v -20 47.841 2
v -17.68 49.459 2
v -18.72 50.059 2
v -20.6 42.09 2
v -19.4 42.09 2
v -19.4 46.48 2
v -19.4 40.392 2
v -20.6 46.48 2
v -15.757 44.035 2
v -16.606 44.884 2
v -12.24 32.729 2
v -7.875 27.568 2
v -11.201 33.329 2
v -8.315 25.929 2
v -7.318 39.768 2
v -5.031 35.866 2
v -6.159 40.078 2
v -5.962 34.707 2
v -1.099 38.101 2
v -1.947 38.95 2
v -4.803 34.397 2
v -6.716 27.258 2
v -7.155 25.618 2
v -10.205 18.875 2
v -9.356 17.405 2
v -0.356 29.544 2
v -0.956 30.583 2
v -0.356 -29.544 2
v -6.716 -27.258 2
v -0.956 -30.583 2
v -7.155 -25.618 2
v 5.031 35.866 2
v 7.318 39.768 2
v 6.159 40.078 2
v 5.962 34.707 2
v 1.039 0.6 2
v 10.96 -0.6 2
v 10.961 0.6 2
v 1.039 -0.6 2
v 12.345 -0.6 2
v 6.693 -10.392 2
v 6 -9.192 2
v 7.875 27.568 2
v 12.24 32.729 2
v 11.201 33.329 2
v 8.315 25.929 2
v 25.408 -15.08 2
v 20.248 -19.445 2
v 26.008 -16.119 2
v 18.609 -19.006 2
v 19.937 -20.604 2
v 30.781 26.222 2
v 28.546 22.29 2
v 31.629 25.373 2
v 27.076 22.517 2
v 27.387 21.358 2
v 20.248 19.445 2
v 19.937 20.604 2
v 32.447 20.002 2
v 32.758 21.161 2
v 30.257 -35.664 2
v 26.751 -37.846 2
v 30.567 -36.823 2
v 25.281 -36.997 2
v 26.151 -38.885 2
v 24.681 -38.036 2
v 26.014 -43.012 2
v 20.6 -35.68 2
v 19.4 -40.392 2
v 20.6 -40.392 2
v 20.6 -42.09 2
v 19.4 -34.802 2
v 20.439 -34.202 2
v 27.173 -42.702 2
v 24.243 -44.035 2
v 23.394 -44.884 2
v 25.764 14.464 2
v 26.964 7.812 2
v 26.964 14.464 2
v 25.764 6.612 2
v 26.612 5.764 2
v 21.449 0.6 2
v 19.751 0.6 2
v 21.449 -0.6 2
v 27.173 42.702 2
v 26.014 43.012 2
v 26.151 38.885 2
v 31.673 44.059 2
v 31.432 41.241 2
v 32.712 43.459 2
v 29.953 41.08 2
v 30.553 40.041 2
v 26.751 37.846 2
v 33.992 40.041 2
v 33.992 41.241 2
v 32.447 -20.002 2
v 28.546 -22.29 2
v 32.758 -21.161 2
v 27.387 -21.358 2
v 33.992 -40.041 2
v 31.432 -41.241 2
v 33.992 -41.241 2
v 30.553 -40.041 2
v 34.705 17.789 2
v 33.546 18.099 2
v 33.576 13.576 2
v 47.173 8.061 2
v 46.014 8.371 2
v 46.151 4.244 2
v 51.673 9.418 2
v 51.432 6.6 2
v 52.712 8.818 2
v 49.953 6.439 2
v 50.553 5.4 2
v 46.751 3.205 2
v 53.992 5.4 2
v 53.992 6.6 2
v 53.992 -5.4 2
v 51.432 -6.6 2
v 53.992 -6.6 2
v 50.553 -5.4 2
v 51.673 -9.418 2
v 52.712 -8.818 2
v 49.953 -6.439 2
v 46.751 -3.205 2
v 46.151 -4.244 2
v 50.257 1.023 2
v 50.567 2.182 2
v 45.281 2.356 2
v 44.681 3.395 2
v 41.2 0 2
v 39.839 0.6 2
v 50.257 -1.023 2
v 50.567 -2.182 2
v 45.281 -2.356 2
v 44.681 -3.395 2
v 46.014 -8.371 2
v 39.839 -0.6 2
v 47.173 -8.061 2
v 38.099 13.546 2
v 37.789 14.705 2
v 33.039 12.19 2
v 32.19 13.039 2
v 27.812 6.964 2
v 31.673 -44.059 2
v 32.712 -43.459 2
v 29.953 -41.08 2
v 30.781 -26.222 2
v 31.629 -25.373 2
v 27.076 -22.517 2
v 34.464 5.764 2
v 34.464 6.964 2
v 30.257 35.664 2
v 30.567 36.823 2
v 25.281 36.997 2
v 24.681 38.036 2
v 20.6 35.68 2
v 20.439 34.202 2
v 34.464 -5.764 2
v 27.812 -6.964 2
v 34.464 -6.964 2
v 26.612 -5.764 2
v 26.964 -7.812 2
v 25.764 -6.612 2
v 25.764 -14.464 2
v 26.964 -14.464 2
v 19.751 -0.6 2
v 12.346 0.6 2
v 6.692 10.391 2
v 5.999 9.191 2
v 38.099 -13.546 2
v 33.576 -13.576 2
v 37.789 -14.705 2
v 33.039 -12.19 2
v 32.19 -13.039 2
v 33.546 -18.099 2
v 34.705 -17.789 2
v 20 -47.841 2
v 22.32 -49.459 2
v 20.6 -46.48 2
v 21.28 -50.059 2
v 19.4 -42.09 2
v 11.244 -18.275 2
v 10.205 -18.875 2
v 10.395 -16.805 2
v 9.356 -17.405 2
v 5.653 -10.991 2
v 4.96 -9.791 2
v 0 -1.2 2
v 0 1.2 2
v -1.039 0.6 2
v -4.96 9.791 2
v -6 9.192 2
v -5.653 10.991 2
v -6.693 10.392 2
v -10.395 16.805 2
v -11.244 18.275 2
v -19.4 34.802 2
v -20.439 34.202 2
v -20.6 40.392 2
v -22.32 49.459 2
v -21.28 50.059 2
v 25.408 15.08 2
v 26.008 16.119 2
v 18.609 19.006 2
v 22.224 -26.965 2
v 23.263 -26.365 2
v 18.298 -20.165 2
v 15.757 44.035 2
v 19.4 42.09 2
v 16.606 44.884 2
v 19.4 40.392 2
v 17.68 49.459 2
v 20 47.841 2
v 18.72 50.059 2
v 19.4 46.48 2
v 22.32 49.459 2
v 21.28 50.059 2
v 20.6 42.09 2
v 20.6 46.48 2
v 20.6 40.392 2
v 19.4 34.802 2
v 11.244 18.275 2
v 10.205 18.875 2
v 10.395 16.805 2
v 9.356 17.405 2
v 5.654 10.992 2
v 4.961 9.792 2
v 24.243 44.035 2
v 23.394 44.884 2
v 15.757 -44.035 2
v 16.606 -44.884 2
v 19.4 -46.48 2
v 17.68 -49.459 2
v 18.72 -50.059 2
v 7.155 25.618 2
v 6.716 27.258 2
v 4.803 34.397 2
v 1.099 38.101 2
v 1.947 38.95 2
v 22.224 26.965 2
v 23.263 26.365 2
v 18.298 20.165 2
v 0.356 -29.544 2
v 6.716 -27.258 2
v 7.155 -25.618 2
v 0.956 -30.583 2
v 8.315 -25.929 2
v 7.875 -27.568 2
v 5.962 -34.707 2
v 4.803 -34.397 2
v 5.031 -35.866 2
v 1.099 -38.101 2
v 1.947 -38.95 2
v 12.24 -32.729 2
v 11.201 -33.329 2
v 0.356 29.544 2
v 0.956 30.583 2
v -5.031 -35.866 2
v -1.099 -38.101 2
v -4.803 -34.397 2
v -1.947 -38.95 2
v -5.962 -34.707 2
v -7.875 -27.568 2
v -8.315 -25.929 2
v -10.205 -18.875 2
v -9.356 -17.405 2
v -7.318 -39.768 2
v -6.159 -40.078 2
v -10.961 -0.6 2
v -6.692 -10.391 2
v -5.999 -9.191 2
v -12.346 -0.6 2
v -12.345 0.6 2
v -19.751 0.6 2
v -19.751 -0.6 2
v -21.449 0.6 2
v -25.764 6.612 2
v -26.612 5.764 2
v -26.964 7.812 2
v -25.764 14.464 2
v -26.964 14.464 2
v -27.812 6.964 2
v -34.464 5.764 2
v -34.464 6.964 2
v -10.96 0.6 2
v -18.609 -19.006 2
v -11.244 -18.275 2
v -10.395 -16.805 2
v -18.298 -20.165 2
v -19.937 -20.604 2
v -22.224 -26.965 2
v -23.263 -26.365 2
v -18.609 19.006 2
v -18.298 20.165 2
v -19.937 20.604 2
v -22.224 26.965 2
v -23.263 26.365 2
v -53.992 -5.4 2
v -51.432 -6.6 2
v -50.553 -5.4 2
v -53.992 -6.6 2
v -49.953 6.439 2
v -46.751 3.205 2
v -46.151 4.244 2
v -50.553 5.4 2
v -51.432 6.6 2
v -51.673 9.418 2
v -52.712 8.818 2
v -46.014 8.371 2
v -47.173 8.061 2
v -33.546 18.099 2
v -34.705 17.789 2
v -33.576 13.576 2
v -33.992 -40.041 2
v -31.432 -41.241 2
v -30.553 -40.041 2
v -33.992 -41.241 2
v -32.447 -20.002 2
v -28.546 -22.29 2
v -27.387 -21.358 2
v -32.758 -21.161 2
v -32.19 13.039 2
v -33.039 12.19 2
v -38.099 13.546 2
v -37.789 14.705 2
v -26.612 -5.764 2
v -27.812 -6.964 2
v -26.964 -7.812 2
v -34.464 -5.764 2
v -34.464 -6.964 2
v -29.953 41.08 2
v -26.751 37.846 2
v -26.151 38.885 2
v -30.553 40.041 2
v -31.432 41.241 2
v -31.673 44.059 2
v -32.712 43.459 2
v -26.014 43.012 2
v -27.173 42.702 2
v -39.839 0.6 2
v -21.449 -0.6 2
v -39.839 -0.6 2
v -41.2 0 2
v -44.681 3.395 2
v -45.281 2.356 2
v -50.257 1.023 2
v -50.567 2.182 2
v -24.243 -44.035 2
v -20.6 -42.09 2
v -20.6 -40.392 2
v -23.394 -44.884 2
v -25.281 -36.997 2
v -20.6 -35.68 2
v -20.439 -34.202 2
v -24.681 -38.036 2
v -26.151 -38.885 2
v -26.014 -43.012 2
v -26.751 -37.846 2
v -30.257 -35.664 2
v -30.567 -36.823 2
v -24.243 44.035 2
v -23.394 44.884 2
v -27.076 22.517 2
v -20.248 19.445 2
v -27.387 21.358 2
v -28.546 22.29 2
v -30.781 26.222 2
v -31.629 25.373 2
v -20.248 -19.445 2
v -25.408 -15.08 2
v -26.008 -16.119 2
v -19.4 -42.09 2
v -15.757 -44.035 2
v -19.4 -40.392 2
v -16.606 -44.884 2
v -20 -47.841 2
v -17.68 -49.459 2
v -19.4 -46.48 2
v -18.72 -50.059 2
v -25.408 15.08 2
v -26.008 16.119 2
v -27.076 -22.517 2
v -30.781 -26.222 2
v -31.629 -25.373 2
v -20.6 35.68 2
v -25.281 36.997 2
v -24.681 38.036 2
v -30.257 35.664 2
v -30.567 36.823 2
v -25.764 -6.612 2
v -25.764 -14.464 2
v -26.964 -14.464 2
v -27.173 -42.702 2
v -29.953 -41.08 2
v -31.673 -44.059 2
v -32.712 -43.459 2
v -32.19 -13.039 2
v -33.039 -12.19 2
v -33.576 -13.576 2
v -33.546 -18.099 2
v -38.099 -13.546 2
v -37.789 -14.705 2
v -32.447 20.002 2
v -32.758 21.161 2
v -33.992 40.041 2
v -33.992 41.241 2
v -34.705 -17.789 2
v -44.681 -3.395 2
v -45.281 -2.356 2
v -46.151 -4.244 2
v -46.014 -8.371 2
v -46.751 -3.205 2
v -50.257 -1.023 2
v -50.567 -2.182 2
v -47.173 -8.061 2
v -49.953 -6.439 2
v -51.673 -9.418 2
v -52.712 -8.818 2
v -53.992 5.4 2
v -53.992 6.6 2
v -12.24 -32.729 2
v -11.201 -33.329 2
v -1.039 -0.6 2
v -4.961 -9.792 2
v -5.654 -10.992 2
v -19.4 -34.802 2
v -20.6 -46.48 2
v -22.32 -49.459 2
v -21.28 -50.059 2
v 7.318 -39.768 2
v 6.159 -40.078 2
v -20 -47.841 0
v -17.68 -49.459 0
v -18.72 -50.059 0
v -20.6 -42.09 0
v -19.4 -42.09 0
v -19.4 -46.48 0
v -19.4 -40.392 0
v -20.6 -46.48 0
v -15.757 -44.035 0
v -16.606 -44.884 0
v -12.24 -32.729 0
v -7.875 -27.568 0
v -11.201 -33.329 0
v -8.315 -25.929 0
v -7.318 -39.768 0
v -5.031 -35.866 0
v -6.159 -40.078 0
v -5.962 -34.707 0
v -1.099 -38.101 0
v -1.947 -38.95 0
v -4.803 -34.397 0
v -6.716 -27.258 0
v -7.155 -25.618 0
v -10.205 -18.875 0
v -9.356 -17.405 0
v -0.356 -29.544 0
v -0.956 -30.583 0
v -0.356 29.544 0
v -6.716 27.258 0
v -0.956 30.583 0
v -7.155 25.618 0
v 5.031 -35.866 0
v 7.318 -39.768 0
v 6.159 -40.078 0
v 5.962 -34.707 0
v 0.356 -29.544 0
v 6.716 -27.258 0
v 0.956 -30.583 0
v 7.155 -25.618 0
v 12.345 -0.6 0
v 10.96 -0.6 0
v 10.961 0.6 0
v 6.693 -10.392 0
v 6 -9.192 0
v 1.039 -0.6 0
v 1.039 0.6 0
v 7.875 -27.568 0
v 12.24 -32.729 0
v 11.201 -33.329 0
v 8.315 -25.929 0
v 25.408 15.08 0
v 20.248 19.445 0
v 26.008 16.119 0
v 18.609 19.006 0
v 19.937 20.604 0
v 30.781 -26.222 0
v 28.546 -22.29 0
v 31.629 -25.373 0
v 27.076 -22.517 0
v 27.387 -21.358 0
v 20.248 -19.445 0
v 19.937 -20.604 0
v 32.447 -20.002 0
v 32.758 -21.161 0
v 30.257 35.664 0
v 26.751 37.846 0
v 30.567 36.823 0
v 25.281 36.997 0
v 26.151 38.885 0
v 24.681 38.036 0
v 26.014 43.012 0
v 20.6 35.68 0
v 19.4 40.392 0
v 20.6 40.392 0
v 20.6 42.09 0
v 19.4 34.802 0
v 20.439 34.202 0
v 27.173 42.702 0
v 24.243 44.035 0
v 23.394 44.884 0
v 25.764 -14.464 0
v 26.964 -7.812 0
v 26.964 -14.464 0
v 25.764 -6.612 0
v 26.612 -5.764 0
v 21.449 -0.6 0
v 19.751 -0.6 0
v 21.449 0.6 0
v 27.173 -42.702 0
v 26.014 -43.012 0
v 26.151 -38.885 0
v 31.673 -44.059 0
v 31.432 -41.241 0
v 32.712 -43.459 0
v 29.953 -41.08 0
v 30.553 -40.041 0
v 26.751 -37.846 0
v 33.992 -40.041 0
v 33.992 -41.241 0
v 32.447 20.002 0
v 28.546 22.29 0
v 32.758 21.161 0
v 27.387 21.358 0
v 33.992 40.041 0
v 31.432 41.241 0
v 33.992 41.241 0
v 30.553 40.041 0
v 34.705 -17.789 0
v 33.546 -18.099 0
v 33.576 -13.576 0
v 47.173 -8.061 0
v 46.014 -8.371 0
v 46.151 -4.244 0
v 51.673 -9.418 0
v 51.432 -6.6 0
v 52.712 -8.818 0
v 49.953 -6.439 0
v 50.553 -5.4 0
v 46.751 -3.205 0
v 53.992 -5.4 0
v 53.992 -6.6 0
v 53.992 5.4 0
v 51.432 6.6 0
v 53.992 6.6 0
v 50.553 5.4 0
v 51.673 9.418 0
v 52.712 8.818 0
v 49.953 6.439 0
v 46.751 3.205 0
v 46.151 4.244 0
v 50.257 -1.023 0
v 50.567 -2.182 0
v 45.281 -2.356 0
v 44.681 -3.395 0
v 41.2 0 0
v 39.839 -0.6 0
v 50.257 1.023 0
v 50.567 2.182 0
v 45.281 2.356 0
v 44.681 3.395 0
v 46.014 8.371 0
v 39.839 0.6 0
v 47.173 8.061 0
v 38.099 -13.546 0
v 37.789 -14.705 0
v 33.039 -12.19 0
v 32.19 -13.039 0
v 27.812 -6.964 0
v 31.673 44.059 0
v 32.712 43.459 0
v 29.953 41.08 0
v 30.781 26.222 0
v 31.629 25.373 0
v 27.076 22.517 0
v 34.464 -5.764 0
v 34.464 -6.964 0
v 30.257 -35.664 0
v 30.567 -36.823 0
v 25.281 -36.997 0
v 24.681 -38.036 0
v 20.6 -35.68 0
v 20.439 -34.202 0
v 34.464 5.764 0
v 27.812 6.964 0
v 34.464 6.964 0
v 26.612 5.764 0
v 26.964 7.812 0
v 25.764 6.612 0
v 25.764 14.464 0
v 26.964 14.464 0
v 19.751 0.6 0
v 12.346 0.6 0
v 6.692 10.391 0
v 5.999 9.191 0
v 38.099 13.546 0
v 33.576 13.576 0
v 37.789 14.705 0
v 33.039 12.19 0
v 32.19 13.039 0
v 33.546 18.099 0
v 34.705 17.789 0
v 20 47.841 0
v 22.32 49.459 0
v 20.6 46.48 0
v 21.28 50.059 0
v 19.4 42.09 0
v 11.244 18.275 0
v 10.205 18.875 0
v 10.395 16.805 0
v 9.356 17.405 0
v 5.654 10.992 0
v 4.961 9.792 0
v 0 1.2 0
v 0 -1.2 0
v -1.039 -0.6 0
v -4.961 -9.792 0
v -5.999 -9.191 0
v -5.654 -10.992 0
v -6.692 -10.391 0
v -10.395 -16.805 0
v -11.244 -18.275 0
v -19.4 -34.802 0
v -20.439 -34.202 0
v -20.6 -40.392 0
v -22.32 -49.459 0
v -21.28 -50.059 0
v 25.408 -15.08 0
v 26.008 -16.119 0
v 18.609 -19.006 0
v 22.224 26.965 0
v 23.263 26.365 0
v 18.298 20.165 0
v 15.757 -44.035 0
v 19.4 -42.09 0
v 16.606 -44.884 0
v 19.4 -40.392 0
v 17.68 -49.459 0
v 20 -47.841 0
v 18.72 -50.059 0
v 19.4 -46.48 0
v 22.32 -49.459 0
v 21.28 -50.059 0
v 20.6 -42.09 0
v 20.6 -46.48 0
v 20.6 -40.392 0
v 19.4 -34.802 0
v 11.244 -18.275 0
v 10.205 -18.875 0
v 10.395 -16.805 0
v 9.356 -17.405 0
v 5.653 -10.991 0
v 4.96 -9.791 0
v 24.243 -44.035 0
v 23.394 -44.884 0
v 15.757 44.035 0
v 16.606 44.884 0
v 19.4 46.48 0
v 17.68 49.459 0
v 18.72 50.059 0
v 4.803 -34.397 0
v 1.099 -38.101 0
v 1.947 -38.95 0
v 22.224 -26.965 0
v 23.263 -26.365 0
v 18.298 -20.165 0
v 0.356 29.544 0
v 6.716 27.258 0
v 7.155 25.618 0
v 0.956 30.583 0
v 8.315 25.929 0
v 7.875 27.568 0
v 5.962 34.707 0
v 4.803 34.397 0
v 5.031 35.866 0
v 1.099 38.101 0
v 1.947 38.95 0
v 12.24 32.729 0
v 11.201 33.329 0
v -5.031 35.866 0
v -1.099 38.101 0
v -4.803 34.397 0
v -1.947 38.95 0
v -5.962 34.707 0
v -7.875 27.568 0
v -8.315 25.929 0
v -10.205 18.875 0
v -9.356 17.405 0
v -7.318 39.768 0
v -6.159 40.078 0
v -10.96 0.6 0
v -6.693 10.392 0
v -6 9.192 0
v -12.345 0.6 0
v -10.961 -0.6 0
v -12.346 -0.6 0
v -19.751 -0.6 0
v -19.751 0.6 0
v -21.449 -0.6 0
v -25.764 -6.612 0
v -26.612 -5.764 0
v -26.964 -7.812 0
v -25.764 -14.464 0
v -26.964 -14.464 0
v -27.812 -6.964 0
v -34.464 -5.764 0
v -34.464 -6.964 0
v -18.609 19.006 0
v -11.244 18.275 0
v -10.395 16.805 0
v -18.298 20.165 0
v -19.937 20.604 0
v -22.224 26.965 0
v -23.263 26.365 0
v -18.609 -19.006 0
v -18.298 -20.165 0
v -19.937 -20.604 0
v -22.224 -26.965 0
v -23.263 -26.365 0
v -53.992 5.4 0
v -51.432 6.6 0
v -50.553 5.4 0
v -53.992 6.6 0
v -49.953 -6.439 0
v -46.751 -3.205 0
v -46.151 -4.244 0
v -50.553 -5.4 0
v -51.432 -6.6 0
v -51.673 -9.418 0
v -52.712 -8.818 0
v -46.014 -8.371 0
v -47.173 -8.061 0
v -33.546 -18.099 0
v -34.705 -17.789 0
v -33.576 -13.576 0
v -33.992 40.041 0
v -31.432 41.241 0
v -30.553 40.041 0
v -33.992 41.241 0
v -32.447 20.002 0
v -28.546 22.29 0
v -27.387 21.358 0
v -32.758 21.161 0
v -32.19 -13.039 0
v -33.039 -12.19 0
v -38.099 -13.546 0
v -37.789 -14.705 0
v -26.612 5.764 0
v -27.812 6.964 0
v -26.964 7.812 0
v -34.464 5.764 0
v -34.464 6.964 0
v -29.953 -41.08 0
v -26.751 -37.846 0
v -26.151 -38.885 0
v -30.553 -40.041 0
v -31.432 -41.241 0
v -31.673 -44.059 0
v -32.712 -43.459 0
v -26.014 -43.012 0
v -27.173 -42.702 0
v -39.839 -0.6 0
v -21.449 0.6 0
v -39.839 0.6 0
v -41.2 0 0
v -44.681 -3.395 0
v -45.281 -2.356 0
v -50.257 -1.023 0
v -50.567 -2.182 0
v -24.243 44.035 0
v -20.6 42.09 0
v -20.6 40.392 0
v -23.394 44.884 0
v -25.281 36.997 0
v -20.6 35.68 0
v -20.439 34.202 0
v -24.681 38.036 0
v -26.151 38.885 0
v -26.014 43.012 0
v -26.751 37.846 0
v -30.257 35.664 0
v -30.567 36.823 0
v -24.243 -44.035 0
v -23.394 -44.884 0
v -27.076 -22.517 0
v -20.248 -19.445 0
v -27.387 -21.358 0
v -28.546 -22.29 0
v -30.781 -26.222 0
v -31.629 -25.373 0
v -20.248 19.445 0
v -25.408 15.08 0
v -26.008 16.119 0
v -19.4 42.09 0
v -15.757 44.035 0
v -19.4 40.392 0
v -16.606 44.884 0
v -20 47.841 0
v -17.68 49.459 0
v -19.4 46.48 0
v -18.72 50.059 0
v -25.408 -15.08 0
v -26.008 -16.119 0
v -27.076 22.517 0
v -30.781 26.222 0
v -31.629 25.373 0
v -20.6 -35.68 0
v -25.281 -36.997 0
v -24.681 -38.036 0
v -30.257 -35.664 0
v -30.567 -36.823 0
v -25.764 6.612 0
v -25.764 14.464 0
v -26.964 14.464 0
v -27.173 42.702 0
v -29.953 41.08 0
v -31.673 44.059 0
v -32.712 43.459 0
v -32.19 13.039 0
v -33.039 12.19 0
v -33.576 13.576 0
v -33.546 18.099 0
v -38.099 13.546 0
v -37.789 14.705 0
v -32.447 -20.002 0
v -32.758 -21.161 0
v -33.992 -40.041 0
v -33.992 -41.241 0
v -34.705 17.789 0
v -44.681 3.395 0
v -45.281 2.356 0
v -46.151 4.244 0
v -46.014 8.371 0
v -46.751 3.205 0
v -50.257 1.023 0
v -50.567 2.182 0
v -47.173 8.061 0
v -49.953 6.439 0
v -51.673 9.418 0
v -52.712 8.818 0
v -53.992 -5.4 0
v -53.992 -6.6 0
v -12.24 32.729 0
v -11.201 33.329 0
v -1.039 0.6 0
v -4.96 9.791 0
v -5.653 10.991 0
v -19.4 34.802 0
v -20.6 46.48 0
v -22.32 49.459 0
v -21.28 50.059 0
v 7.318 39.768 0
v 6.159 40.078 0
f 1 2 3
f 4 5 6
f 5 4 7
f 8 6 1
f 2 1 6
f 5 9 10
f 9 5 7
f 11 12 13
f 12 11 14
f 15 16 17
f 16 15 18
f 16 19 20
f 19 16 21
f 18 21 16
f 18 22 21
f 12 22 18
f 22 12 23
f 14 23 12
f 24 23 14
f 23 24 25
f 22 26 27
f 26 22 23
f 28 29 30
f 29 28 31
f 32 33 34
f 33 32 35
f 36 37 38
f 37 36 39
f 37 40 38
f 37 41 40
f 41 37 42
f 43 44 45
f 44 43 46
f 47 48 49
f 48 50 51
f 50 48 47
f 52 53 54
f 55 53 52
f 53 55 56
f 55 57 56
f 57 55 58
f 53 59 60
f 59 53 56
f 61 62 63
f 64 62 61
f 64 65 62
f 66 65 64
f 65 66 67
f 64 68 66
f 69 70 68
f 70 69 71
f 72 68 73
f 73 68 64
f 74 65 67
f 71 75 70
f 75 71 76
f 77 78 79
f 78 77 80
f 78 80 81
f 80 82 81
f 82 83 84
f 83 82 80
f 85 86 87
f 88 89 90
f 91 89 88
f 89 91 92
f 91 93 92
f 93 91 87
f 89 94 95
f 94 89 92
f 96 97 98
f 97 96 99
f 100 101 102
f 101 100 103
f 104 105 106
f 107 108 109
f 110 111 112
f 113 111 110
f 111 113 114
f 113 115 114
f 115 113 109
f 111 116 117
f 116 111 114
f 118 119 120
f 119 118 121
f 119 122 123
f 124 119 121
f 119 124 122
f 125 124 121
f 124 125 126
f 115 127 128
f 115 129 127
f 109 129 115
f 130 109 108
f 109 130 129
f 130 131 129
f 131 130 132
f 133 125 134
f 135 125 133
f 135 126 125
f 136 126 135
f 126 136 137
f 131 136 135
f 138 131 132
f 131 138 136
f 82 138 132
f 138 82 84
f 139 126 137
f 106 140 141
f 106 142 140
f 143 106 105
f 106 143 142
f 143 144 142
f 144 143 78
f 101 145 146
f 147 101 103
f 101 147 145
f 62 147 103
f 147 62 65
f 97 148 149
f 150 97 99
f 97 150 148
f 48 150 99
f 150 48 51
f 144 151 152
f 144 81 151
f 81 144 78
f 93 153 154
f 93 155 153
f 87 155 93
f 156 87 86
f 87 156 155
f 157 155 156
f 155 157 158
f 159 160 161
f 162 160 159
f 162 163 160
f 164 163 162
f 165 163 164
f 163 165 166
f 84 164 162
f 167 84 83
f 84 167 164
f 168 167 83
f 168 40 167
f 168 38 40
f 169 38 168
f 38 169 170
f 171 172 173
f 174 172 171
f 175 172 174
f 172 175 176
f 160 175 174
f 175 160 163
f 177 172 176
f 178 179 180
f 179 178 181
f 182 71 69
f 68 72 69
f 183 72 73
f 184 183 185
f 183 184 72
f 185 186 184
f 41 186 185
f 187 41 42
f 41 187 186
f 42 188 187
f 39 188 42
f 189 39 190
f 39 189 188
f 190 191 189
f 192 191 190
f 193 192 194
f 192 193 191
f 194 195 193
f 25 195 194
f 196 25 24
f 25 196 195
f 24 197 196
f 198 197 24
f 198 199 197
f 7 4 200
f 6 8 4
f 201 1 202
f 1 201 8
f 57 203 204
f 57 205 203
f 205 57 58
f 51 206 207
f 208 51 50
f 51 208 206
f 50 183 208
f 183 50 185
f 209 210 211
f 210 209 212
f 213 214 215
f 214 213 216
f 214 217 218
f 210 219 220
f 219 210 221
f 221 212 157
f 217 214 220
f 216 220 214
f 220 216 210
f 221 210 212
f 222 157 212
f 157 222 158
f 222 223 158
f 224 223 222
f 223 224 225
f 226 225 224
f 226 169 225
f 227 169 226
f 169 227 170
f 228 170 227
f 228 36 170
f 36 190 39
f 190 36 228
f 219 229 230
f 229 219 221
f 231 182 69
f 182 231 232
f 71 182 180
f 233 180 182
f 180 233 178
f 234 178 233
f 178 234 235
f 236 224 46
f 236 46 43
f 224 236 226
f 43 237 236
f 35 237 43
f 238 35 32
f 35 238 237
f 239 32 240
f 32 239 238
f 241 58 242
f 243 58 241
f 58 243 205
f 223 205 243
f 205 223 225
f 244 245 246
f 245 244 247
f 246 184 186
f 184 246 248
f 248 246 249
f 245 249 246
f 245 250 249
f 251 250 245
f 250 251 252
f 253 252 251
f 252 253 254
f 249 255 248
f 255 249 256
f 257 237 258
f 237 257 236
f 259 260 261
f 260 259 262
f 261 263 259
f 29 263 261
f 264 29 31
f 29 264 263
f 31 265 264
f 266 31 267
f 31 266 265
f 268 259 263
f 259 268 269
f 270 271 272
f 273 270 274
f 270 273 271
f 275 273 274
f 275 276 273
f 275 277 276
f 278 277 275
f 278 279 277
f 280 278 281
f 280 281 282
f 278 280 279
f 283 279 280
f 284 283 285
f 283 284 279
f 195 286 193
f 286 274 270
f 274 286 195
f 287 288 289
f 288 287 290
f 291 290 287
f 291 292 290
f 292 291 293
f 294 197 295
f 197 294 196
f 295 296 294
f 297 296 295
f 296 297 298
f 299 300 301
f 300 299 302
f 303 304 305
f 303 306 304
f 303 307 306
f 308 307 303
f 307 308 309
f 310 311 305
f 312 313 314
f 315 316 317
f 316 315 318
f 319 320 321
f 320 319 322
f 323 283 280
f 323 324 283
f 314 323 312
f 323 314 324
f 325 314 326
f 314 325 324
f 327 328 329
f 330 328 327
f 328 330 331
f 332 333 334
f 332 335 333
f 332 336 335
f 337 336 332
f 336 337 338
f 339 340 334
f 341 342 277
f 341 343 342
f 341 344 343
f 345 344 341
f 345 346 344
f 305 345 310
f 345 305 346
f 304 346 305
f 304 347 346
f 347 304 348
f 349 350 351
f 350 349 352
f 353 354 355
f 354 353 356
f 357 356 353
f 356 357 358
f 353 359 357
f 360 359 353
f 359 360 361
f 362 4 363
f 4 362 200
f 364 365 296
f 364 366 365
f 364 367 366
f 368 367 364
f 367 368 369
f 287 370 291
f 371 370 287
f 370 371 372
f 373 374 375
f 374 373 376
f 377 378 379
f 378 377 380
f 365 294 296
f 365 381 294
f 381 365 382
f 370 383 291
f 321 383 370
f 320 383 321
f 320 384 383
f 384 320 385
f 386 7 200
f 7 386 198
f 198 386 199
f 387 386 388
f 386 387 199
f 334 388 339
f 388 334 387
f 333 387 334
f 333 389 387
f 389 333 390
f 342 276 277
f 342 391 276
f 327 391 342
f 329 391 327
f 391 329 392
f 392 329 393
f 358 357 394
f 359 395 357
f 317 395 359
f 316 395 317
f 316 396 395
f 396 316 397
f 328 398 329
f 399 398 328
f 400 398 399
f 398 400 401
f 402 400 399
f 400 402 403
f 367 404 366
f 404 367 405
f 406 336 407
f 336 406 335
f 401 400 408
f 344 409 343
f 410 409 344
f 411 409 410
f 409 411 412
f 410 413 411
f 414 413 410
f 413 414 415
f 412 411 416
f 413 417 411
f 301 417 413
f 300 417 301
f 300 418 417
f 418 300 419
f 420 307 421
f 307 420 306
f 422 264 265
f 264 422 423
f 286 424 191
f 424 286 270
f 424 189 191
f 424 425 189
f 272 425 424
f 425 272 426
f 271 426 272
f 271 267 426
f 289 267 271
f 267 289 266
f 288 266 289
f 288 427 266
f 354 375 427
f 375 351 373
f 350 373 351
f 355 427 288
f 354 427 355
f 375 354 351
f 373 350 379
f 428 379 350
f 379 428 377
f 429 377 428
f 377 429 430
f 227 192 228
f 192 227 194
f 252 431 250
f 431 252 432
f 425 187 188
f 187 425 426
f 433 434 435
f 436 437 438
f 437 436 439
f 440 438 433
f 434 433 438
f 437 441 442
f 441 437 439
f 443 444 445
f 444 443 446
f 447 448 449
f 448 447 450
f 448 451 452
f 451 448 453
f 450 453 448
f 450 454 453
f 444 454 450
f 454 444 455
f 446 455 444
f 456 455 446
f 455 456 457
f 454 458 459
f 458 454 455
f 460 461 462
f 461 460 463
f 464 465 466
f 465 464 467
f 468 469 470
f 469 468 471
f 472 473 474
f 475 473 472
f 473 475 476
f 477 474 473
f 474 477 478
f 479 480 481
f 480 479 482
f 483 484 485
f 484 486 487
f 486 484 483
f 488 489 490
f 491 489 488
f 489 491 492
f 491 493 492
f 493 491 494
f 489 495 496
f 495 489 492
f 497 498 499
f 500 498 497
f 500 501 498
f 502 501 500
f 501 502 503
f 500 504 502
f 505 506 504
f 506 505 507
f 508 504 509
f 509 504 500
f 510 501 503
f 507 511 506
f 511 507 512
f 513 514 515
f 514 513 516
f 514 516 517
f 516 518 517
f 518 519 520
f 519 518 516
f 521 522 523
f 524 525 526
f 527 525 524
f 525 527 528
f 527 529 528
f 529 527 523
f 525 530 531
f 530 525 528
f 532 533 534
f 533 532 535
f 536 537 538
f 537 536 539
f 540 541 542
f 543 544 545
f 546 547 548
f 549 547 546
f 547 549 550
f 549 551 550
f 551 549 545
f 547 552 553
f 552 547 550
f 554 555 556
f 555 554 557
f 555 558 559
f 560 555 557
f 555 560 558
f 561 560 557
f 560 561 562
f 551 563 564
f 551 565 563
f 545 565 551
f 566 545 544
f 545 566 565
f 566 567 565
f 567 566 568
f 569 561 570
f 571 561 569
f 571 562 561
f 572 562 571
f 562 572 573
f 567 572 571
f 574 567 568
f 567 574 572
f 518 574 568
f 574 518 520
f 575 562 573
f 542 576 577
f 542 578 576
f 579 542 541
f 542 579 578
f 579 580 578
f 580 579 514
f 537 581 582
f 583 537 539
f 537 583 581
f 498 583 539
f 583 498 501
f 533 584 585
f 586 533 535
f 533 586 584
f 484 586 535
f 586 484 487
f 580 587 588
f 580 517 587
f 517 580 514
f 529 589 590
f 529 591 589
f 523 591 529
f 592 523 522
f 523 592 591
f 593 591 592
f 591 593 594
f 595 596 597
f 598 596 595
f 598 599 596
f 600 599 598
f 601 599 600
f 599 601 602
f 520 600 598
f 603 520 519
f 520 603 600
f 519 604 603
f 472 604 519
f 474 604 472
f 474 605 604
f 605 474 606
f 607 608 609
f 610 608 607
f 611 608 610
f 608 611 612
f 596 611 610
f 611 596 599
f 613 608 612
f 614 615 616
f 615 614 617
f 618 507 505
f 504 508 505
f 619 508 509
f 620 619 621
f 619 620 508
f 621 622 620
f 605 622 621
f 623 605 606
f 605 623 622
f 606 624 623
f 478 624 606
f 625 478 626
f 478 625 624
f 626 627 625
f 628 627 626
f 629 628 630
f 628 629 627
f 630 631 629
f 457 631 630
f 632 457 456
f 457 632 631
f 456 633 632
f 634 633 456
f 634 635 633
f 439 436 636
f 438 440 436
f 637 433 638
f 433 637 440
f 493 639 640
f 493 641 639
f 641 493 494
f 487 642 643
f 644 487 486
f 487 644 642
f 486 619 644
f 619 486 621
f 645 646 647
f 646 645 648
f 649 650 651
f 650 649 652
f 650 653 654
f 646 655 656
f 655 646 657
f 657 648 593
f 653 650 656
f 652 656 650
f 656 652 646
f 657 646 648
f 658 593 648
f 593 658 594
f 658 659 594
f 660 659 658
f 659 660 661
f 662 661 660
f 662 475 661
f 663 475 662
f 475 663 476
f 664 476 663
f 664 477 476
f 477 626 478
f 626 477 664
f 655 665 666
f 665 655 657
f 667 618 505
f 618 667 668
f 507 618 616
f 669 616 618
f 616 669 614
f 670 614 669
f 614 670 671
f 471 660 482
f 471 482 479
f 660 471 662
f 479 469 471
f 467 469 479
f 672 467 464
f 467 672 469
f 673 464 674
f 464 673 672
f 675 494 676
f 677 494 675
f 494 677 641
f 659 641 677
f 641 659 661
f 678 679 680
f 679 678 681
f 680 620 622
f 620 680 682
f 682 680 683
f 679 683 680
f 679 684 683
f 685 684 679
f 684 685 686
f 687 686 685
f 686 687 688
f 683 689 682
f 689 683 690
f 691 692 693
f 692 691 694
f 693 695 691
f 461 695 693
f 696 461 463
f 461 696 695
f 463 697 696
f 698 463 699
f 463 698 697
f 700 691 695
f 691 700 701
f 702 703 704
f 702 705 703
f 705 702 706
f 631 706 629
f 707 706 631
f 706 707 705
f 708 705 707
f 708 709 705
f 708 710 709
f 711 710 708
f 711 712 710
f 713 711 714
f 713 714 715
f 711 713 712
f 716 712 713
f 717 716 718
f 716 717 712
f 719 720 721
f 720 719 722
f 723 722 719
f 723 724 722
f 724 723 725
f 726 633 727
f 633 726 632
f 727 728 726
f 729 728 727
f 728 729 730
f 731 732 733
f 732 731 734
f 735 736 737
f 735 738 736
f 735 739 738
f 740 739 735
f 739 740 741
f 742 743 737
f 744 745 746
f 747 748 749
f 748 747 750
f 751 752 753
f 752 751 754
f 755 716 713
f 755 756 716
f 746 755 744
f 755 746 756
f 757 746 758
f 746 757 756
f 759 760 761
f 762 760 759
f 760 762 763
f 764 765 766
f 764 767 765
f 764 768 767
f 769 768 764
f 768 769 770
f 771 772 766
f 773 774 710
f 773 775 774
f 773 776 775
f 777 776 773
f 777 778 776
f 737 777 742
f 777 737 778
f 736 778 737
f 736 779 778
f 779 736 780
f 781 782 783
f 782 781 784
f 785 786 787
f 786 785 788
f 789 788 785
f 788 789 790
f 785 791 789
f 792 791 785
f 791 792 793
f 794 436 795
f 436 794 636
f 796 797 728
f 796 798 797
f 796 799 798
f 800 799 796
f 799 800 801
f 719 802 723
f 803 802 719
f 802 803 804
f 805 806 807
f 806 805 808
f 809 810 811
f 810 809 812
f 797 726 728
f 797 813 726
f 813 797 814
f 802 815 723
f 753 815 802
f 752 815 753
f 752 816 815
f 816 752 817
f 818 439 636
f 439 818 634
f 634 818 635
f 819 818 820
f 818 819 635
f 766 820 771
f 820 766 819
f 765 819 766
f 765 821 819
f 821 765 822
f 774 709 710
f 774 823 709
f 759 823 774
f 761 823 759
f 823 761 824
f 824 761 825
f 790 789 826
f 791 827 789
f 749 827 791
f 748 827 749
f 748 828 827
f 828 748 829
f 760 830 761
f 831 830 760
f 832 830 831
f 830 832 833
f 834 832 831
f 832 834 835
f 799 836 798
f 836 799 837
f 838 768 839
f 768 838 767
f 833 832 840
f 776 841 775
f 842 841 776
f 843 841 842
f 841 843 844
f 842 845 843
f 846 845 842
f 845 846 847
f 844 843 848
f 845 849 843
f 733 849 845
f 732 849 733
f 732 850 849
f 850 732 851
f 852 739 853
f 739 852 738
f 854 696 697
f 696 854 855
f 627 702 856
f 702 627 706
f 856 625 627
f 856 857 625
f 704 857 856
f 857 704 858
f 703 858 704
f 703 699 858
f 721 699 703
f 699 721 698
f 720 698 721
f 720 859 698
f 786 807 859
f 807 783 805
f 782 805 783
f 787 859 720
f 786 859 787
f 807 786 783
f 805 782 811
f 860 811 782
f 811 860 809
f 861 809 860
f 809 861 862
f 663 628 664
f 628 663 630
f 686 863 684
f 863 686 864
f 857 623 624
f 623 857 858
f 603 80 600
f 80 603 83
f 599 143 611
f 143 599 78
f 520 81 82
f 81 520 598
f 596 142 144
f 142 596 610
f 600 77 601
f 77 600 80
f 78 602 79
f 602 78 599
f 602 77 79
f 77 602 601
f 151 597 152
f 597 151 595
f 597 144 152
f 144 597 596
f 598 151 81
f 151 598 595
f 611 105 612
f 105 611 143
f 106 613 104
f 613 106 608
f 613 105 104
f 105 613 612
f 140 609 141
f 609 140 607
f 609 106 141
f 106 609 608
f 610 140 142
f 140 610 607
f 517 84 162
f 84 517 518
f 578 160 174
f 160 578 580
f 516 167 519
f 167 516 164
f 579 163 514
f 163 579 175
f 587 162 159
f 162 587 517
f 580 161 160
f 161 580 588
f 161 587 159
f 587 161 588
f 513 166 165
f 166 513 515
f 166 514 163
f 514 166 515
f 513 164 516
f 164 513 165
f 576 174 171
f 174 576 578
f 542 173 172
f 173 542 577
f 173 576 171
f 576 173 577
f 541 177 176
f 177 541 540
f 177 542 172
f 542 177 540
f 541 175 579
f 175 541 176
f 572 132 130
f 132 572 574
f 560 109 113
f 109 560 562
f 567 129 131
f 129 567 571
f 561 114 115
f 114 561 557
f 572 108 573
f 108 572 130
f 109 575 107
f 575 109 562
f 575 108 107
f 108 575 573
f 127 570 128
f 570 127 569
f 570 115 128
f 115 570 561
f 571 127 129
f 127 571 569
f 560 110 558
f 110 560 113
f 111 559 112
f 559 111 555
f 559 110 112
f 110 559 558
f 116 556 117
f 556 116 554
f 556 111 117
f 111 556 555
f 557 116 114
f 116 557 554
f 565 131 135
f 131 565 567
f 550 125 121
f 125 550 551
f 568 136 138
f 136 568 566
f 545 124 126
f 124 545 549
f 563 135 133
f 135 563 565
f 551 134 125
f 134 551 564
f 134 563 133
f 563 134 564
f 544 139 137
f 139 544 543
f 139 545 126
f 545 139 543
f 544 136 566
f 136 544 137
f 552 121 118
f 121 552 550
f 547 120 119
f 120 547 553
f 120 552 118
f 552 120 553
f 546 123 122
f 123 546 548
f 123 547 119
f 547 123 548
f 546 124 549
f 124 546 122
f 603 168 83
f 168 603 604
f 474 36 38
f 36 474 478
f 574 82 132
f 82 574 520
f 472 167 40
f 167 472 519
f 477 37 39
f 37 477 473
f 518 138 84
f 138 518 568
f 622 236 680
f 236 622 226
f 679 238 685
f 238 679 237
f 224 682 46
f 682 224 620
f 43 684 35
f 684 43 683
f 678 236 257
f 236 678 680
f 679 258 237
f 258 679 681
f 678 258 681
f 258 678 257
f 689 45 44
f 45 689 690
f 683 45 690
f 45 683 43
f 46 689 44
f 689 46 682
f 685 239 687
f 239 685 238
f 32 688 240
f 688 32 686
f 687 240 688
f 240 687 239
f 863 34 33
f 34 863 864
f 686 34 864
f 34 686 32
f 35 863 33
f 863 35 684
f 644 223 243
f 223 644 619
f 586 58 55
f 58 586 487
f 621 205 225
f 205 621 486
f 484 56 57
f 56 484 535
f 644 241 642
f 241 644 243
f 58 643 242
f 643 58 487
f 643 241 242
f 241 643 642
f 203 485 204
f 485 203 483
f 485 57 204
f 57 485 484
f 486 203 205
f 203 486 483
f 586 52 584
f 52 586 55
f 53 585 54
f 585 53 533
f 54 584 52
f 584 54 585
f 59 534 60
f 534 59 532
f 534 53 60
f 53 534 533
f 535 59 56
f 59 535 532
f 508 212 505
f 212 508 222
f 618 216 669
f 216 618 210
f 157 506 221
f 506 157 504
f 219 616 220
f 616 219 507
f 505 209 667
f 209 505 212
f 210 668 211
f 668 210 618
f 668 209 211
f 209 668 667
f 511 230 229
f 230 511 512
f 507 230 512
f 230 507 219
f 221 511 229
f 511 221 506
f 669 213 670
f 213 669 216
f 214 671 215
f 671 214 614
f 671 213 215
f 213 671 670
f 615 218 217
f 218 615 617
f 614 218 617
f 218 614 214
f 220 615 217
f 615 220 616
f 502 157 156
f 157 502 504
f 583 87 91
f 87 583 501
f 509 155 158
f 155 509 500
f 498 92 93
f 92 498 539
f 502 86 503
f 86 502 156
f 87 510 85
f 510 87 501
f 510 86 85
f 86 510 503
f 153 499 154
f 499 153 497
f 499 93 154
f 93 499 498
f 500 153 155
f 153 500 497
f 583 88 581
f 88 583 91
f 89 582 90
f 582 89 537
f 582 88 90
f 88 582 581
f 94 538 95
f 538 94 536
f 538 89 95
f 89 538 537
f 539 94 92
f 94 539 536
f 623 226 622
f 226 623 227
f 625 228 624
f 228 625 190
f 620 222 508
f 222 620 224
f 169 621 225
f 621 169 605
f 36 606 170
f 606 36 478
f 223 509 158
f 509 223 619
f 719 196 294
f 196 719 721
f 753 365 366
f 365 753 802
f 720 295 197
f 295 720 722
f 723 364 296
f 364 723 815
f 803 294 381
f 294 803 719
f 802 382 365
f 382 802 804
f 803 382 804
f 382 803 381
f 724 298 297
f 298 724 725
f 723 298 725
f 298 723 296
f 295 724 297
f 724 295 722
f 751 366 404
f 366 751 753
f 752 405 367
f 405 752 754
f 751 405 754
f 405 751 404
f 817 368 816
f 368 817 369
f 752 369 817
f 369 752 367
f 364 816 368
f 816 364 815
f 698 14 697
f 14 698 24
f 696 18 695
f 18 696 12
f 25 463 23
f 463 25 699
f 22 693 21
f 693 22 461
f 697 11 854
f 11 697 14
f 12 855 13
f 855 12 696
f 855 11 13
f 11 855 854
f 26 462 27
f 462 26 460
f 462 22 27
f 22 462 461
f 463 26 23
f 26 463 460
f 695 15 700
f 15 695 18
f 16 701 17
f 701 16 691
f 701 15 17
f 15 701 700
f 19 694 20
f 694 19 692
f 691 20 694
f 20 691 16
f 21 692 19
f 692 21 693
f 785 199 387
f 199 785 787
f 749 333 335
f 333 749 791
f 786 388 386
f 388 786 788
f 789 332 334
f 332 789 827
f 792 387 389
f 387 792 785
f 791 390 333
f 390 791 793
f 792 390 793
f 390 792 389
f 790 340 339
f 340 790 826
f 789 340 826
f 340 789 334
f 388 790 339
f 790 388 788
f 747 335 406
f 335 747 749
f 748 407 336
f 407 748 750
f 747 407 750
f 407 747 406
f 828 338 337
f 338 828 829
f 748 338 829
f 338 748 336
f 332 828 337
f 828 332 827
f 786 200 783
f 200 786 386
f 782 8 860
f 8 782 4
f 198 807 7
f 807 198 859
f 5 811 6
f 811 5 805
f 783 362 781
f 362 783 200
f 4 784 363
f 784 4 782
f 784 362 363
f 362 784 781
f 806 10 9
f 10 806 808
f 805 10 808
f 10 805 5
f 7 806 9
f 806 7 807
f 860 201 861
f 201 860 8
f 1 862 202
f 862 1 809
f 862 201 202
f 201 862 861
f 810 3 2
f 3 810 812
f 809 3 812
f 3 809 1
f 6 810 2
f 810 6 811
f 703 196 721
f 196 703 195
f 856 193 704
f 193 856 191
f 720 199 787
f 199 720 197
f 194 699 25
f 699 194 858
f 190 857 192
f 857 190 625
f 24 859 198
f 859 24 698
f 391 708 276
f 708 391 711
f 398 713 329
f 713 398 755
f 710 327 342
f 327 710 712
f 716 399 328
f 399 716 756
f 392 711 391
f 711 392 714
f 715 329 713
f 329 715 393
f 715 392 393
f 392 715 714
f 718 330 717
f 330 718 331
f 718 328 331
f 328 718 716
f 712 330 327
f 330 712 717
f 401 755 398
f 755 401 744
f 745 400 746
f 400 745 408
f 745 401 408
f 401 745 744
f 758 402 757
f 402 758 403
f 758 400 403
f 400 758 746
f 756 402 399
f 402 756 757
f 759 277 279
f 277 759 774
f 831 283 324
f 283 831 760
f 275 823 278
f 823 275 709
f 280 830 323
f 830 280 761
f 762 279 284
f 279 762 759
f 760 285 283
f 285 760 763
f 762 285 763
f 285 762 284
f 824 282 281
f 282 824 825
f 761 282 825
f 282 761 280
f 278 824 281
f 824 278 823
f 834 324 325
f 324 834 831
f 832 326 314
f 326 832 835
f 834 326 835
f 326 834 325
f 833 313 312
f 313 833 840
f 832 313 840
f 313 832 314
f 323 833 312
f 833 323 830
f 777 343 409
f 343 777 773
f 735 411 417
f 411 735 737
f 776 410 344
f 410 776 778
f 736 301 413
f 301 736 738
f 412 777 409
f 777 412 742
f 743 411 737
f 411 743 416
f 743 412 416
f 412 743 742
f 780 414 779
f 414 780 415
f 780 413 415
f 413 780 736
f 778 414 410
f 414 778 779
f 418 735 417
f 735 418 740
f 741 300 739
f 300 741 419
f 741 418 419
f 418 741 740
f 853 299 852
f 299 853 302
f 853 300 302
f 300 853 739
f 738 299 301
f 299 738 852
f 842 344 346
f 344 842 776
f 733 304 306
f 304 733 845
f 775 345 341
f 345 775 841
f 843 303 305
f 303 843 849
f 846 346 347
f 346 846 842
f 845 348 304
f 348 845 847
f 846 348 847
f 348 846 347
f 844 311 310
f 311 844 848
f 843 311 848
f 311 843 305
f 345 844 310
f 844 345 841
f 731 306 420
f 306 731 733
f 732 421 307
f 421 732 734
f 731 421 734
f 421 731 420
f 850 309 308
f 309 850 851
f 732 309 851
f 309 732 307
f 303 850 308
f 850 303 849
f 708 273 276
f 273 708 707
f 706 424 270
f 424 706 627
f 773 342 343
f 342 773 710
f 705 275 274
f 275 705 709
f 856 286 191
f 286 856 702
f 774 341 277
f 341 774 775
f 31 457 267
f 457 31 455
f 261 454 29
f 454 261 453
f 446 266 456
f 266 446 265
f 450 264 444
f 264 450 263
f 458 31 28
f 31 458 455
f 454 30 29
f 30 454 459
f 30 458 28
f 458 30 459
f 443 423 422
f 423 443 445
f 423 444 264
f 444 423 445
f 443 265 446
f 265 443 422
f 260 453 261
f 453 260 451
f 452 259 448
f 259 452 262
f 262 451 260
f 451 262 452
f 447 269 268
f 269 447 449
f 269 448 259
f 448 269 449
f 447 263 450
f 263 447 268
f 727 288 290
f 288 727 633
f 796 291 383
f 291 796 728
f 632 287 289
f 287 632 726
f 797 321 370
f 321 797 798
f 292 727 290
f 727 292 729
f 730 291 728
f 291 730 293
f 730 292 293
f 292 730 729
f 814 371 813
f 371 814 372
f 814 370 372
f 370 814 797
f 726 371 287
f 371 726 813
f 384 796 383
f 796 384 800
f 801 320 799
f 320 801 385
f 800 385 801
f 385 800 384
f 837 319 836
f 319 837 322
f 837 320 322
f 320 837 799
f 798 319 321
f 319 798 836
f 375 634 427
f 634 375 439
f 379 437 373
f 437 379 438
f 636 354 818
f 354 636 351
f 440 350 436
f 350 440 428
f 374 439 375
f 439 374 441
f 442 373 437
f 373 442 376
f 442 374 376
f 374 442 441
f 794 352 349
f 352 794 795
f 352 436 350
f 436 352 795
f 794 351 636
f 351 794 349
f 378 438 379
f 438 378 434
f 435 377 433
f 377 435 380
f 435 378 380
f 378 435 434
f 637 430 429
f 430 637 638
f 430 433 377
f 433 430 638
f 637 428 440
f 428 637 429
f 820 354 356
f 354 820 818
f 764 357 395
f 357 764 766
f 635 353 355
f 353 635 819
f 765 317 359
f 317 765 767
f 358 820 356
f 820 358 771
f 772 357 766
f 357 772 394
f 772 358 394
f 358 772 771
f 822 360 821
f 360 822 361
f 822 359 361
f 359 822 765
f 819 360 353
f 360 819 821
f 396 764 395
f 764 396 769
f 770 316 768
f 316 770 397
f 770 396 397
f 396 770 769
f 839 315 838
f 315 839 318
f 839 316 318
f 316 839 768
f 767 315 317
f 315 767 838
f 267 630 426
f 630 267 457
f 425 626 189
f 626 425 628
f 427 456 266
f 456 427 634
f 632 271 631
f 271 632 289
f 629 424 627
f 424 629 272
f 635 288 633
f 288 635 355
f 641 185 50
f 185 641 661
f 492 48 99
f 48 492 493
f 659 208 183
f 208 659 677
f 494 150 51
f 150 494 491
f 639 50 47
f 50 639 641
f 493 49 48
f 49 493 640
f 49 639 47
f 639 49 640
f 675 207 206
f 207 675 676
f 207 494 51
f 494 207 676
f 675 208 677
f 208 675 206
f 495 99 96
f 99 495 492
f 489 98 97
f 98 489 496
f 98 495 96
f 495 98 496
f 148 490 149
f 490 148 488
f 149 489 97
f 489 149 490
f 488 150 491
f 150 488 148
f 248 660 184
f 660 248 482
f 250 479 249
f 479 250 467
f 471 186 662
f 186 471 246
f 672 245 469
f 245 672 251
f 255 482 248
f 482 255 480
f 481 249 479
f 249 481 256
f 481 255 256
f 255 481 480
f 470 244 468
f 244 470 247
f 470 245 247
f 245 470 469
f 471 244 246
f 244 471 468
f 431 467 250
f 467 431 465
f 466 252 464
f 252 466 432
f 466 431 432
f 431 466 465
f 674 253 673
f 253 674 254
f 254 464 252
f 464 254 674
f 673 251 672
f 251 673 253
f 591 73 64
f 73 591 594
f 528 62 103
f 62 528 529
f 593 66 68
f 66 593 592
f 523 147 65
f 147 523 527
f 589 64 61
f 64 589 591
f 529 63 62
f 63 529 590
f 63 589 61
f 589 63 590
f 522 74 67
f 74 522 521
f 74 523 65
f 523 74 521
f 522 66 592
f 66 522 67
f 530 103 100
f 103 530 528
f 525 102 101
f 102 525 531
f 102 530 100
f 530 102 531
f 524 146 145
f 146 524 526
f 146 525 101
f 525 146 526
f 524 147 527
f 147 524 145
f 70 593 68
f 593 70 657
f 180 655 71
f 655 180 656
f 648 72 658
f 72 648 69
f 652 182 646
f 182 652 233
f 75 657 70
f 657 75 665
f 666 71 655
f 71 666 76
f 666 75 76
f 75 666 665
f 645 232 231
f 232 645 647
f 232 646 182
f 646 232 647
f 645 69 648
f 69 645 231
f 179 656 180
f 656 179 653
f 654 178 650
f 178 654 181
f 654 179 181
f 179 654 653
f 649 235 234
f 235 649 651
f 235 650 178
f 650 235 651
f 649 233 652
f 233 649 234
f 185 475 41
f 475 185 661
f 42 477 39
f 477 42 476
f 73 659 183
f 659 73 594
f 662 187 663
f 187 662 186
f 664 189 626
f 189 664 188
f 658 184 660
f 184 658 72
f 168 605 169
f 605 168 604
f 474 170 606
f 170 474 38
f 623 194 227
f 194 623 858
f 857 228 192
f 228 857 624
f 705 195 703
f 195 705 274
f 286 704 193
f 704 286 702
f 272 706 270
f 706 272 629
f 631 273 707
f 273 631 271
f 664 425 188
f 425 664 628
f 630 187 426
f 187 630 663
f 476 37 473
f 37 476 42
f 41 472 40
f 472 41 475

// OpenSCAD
// ========================================================
// 2D Parametric Snowflake / Polyline Art
// ========================================================

// Thickness of the line segments
thickness = 1.2;

// Renders a single line segment using thin cubes
module draw_segment(x1, y1, x2, y2) {
    // Length of the segment
    dx = x2 - x1;
    dy = y2 - y1;
    len = sqrt(dx*dx + dy*dy);
    
    // Calculate angle in degrees
    angle = atan2(dy, dx);
    
    translate([x1, y1, 0])
        rotate([0, 0, angle])
            translate([0, -thickness/2, 0])
                cube([len, thickness, 2]);
}

// Recursing arm generator for fractal snowflake art
module fractal_arm(len, depth) {
    if (depth > 0) {
        // Draw main segment
        draw_segment(0, 0, len, 0);
        
        // Left branch
        translate([len * 0.5, 0, 0])
            rotate([0, 0, 45])
                fractal_arm(len * 0.45, depth - 1);
                
        // Right branch
        translate([len * 0.5, 0, 0])
            rotate([0, 0, -45])
                fractal_arm(len * 0.45, depth - 1);
                
        // Tip left branch
        translate([len, 0, 0])
            rotate([0, 0, 30])
                fractal_arm(len * 0.3, depth - 1);
                
        // Tip right branch
        translate([len, 0, 0])
            rotate([0, 0, -30])
                fractal_arm(len * 0.3, depth - 1);
    }
}

// Generate the full 6-sided symmetric snowflake
union() {
    for (angle = [0:60:300]) {
        rotate([0, 0, angle]) {
            fractal_arm(40, 3);
        }
    }
    
    // Central hexagonal core structure
    for (angle = [0:60:300]) {
        rotate([0, 0, angle]) {
            // Draw hexagonal ring connections
            draw_segment(12, 0, 6, 10.39);
        }
    }
}
